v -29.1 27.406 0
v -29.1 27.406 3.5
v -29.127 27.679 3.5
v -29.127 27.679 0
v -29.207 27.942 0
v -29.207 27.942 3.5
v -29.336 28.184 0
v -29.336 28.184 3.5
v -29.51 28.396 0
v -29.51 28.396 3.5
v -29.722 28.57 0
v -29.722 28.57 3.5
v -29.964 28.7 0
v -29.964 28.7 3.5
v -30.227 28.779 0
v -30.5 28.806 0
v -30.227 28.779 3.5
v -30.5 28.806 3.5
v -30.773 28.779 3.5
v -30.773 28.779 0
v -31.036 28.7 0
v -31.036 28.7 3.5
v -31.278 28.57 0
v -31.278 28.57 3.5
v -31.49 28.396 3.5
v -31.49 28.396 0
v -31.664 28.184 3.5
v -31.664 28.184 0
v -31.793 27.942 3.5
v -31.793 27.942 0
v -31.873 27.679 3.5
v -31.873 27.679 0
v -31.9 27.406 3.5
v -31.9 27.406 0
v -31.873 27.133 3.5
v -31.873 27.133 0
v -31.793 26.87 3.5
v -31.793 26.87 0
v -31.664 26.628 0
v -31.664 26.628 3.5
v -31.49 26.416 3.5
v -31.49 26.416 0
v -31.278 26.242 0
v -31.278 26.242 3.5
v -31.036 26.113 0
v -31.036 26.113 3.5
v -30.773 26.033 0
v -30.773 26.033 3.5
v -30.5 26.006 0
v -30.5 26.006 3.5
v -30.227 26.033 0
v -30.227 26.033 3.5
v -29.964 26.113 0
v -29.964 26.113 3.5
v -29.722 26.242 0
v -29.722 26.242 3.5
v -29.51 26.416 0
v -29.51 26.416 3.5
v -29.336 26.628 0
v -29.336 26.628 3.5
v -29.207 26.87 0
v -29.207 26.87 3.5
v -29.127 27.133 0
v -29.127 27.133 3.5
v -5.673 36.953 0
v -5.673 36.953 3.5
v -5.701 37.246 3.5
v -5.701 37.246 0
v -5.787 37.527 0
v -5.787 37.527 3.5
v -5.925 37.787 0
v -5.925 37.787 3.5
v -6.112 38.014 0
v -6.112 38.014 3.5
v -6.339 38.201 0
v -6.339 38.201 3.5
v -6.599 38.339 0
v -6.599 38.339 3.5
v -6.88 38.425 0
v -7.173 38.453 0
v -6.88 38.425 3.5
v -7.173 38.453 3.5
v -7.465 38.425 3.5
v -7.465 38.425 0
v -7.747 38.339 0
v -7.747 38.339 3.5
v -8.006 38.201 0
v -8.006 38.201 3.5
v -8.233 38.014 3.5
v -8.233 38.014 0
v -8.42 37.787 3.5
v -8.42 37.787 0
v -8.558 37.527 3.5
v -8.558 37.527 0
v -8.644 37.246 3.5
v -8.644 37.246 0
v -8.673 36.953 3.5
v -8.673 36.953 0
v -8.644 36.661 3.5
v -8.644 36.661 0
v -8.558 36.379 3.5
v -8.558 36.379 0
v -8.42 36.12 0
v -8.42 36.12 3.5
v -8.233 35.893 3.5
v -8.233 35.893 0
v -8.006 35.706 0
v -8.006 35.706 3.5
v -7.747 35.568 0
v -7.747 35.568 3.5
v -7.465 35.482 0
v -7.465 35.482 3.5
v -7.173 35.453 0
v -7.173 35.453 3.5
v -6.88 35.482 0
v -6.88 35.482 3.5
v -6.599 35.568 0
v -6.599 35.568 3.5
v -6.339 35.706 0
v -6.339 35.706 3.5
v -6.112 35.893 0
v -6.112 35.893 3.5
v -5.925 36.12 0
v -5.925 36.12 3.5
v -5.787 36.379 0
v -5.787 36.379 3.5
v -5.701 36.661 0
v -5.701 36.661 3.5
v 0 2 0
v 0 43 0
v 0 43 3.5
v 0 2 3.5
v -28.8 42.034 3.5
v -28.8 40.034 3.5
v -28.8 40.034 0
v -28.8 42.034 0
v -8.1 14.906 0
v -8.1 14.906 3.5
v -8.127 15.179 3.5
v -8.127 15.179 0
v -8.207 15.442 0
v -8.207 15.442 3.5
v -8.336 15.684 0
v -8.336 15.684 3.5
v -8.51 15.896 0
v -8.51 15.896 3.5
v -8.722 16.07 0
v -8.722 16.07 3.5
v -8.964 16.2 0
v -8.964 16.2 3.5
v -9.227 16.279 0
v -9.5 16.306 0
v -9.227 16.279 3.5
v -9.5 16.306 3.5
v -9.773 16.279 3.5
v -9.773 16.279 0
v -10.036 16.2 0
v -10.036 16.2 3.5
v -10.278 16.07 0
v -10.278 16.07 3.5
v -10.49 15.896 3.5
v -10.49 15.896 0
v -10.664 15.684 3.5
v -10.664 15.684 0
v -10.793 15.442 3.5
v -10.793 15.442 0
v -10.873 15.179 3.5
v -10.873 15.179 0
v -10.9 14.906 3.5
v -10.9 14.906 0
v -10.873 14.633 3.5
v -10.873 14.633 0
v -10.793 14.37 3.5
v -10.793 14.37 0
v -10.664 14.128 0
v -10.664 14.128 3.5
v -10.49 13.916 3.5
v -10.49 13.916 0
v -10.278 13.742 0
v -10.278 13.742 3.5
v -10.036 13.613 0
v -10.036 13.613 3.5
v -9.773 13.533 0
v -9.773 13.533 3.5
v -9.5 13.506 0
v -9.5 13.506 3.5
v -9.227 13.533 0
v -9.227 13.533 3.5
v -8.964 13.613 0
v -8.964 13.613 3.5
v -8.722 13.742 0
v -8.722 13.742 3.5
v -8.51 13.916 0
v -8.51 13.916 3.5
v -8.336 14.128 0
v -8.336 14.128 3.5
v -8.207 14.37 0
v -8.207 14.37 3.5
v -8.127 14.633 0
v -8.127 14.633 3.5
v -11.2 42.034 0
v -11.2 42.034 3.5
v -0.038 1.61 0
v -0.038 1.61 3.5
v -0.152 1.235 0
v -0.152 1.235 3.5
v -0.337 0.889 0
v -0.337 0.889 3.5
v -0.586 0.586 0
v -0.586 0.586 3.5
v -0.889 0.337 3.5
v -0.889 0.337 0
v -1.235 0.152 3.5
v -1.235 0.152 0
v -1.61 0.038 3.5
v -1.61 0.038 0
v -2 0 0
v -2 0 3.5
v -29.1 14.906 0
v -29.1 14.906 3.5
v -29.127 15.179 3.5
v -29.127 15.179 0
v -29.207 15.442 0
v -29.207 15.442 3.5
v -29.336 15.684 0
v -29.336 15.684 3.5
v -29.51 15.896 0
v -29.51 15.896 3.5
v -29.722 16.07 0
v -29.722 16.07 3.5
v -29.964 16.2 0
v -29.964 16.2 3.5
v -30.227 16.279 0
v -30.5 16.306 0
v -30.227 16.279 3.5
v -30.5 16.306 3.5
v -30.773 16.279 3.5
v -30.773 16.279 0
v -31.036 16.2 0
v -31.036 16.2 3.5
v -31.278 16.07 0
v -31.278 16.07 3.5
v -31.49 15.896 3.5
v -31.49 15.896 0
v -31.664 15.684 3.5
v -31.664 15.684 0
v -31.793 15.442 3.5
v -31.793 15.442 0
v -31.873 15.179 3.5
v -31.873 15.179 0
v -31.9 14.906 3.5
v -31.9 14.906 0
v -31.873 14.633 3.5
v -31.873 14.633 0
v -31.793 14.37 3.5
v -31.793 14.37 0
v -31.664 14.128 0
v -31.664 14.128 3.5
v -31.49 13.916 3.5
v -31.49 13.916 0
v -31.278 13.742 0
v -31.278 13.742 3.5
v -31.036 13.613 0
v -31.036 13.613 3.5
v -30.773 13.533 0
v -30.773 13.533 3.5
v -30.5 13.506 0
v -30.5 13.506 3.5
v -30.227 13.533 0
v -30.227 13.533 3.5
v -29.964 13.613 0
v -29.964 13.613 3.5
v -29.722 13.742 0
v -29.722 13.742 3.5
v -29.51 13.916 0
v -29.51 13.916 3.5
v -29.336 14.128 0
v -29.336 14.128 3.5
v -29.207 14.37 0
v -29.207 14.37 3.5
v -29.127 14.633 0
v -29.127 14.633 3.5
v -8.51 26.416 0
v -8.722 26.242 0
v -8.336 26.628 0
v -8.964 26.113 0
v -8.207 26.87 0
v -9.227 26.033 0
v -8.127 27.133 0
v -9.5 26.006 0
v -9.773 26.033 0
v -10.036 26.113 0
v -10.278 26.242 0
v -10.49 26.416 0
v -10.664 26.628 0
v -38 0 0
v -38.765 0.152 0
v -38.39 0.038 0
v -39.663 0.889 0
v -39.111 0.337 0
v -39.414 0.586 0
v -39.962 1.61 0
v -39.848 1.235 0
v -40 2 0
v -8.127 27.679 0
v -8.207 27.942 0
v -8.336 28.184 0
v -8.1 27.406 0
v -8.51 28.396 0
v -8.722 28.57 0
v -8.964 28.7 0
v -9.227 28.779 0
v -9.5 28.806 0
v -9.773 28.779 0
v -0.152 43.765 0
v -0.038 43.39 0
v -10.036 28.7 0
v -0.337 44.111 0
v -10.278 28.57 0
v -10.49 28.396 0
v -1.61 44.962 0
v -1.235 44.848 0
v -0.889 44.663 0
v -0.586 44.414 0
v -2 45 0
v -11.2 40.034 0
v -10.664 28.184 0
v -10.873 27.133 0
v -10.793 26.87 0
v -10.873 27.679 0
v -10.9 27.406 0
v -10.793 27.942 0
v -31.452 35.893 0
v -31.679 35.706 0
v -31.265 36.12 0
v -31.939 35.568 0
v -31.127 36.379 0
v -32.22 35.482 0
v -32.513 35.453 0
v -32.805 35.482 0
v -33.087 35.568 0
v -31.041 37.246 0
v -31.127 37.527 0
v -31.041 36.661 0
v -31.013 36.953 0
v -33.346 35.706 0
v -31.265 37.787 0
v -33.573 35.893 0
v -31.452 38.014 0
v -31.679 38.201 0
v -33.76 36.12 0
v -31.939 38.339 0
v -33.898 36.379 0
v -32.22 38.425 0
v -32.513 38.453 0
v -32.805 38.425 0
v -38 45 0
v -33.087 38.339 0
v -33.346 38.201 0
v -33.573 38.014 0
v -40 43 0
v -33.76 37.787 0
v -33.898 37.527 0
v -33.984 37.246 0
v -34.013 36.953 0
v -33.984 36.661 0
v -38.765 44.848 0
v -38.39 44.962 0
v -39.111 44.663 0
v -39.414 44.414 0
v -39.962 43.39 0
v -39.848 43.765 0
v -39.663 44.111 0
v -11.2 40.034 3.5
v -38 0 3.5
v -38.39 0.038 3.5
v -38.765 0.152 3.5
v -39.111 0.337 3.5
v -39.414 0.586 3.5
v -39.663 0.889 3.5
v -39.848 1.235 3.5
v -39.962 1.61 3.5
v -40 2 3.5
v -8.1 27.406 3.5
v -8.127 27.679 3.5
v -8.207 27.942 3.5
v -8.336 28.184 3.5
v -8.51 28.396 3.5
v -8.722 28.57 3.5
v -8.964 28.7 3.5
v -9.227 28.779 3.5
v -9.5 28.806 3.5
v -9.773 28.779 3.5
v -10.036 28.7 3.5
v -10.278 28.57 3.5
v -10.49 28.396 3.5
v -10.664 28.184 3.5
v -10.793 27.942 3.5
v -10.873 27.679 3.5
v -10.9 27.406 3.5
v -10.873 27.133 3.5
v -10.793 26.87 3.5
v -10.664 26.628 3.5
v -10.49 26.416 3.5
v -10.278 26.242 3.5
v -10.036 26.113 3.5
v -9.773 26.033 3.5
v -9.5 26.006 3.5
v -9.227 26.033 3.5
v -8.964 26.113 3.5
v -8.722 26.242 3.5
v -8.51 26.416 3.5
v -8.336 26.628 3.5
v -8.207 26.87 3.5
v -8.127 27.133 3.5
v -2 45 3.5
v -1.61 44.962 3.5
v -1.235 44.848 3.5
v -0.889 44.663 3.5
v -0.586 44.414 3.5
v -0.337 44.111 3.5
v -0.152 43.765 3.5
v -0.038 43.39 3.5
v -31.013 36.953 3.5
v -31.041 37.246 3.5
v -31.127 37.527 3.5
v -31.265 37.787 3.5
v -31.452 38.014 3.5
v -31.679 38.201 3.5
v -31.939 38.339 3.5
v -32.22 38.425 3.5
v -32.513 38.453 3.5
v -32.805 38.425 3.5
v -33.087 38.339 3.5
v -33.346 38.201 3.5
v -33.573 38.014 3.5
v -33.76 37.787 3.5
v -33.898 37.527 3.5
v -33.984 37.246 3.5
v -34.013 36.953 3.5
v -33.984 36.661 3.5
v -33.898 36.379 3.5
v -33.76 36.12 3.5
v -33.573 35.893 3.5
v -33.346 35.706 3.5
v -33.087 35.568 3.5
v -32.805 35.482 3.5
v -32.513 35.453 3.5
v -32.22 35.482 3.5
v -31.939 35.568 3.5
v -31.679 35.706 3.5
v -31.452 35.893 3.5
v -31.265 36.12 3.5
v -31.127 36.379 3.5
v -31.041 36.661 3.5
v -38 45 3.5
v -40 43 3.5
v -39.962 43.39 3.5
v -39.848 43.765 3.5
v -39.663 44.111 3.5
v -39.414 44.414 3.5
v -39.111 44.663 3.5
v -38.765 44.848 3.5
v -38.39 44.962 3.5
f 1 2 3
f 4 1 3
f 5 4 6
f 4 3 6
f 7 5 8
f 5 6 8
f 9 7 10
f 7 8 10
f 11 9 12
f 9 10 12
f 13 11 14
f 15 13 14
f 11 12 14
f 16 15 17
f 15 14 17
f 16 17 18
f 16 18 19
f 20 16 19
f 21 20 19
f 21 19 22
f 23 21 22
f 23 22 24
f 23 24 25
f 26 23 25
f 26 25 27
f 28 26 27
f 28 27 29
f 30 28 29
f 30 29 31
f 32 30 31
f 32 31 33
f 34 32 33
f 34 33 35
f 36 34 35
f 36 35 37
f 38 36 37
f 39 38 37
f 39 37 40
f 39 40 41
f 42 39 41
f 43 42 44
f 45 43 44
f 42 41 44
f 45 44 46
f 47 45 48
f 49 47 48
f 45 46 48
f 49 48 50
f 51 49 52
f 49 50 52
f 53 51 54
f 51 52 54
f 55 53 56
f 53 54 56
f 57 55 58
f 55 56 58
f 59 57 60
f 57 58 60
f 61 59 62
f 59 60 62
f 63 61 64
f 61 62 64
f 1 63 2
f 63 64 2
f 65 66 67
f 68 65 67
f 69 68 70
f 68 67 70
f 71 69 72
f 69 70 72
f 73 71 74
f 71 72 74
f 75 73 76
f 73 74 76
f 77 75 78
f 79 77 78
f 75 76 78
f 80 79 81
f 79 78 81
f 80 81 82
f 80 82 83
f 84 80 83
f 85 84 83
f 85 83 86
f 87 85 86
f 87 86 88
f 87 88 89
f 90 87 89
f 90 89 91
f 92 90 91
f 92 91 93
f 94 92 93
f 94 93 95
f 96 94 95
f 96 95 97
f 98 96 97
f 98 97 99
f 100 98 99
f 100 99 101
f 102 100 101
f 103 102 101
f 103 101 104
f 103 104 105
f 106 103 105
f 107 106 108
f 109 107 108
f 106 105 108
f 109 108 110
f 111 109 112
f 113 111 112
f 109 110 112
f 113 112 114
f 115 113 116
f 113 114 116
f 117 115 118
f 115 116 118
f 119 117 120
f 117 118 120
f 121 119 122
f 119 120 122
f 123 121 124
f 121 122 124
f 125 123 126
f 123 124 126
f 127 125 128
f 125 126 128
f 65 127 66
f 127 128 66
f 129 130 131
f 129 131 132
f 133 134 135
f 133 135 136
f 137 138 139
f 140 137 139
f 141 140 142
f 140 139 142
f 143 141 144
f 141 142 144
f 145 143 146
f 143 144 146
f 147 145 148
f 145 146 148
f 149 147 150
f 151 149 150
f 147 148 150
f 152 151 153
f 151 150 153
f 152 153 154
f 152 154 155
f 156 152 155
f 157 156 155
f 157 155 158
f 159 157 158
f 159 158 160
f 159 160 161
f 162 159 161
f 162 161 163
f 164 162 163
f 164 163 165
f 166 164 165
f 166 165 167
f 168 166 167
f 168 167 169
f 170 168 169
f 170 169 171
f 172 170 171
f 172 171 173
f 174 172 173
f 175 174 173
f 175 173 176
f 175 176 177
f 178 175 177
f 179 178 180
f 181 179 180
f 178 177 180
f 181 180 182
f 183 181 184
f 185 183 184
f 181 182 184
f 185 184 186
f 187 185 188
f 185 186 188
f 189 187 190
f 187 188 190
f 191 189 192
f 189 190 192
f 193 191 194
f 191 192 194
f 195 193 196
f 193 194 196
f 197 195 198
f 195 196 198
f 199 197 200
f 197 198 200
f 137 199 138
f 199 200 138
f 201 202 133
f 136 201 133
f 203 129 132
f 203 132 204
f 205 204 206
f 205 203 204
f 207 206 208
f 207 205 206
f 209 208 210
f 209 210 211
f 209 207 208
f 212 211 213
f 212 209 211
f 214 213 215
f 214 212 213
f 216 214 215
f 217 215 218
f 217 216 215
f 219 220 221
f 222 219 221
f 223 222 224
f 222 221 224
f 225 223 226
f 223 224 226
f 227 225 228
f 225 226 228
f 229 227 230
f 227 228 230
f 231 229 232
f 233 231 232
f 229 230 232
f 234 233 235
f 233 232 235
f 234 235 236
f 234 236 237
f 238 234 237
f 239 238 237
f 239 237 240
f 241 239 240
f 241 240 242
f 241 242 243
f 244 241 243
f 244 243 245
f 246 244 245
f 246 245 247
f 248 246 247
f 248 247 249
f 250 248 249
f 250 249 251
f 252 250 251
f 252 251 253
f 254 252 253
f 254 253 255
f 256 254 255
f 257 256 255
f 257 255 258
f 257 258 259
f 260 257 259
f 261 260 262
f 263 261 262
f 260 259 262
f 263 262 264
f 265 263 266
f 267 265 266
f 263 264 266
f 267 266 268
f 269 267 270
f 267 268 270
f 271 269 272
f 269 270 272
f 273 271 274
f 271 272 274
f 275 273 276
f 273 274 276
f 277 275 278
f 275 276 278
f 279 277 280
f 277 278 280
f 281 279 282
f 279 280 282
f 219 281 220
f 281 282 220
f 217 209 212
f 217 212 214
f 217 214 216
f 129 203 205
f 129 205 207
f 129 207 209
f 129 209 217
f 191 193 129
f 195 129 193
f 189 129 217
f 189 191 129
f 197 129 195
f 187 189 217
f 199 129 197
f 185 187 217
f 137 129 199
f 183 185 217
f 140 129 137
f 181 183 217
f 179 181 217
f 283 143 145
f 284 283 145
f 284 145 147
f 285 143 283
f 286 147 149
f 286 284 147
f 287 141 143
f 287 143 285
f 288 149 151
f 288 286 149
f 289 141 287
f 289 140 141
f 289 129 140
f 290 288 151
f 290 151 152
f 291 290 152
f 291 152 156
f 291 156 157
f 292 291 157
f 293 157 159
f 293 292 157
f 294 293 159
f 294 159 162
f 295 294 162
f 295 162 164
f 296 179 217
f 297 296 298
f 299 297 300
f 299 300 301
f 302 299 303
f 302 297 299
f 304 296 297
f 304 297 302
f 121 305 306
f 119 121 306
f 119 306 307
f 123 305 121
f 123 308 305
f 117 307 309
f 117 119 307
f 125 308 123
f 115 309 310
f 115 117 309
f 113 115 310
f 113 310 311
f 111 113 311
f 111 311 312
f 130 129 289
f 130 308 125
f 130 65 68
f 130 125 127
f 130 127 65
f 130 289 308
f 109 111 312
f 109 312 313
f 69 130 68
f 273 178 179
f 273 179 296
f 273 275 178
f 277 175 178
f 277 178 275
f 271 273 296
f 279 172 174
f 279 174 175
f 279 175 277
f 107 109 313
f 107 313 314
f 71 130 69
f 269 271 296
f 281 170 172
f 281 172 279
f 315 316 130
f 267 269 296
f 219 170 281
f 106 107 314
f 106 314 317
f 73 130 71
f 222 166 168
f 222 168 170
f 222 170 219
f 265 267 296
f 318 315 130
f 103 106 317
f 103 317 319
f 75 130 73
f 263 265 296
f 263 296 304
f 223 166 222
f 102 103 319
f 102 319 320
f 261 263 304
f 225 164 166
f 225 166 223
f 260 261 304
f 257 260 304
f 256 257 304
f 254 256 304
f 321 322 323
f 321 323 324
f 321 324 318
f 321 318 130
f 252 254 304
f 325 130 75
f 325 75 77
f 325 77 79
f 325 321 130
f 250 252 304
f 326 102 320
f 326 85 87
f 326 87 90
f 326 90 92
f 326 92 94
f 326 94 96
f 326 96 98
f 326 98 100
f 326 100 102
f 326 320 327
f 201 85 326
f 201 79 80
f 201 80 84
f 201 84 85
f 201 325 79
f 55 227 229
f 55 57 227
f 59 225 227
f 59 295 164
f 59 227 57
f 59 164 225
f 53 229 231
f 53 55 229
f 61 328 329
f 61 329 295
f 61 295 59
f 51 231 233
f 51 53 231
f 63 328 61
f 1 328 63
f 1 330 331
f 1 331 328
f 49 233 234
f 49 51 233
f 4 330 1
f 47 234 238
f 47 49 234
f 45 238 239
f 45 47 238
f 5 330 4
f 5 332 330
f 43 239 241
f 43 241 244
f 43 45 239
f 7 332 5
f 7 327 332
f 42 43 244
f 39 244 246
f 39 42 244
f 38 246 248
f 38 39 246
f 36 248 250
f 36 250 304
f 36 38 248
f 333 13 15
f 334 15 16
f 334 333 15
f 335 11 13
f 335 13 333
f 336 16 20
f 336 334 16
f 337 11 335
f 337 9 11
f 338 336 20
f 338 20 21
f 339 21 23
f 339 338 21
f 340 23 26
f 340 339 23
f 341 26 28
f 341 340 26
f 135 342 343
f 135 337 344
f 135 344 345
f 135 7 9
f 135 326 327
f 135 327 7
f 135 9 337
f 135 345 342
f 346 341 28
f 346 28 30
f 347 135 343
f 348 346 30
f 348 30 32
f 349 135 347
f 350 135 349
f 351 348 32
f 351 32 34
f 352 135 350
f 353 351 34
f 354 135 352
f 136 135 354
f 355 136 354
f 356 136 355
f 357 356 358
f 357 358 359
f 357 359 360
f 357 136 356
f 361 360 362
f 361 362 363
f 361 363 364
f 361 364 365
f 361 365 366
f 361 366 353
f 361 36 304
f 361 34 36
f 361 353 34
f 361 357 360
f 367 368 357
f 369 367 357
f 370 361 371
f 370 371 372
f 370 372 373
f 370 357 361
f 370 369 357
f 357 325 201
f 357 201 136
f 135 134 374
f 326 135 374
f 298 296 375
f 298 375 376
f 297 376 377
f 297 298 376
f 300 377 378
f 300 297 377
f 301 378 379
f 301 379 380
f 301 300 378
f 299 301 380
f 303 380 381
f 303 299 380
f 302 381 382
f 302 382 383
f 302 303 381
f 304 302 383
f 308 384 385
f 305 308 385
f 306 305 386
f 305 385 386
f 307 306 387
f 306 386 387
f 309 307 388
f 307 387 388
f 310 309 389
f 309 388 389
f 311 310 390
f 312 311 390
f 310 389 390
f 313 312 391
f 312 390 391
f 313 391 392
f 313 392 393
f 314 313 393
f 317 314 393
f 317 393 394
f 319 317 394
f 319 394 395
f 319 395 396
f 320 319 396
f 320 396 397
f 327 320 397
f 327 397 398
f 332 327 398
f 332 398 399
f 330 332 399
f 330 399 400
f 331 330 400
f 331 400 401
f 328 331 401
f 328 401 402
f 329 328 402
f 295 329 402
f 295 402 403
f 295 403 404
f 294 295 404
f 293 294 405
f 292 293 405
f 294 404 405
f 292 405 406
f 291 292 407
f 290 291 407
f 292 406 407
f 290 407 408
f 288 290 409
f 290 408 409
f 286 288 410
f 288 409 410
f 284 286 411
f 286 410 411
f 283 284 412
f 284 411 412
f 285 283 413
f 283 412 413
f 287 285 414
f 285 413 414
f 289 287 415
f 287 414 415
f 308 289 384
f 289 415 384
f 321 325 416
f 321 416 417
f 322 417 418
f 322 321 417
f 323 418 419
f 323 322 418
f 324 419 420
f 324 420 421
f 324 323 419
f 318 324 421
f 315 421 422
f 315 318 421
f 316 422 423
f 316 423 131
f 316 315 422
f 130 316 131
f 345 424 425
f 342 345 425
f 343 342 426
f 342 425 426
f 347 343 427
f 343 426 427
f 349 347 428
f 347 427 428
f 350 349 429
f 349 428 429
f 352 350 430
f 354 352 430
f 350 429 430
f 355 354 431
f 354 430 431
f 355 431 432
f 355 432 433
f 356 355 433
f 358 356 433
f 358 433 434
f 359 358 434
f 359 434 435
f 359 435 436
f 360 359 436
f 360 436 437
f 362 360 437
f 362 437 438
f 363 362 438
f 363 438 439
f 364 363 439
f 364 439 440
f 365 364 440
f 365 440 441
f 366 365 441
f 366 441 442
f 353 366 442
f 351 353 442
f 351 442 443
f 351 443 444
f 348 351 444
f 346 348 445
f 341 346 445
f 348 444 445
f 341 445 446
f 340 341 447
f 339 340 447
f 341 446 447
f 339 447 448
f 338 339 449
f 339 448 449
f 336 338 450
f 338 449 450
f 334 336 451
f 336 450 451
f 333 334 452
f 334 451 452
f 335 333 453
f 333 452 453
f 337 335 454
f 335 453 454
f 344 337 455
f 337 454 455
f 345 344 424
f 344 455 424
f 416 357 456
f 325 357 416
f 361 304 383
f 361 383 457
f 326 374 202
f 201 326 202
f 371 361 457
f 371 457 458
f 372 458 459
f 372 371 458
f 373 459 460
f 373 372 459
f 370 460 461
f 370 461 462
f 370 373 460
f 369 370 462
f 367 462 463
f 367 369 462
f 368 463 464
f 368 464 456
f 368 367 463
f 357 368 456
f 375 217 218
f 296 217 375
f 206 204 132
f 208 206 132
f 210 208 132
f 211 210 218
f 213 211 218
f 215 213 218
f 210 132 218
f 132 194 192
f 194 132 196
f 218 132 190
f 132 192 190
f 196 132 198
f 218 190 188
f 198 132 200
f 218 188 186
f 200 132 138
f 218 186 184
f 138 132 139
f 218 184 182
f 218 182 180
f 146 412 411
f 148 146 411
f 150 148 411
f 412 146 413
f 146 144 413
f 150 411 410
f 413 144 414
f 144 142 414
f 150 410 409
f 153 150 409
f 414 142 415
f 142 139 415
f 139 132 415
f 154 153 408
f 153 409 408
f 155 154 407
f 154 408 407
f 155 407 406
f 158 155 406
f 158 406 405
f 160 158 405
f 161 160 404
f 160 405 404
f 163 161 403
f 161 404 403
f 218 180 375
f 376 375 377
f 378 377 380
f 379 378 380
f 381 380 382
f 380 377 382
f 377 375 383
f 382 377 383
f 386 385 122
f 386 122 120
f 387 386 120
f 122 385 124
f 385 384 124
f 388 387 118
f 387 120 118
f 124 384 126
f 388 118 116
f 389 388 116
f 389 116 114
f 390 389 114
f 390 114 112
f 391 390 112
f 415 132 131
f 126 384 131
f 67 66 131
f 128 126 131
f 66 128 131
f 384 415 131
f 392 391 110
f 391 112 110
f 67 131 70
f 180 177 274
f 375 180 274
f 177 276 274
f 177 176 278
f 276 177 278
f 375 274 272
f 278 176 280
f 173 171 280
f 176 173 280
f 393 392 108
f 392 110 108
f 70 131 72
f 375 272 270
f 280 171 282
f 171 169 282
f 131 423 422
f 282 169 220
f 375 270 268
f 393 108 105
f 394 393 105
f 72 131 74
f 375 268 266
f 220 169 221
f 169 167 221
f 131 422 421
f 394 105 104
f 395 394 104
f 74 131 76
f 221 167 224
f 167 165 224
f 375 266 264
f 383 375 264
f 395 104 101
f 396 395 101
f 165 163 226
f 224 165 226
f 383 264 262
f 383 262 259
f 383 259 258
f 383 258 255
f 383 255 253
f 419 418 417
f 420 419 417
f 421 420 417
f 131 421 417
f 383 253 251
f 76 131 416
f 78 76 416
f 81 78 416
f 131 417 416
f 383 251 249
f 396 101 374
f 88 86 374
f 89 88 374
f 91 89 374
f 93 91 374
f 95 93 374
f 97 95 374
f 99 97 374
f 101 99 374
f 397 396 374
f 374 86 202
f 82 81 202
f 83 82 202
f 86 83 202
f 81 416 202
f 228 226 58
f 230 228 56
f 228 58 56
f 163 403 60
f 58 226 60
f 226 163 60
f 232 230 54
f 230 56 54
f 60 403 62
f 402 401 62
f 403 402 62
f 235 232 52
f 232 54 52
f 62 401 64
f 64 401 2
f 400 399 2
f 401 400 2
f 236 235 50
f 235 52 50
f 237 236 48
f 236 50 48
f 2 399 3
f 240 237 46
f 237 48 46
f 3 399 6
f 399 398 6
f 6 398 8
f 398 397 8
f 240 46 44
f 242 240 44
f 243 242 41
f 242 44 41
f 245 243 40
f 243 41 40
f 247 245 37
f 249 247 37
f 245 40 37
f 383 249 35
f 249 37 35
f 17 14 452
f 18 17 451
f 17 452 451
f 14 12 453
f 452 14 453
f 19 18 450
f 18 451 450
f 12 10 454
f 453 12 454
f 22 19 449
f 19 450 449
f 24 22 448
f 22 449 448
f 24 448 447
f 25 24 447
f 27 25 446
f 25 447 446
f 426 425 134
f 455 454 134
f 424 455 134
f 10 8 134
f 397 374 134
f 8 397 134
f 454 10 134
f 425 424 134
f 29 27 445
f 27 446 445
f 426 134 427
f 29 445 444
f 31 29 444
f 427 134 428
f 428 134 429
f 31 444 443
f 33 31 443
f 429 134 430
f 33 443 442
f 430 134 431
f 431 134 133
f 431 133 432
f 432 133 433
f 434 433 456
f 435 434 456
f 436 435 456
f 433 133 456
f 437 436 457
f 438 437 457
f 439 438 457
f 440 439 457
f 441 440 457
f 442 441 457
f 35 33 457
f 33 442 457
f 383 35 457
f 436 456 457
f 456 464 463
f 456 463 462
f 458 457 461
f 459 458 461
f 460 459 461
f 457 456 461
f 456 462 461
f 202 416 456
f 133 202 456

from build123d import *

# Parameters (mm, degrees)
BOSS_EXTRUDE1_DEPTH = 3.5
SKETCH2_W           = 8.8
SKETCH2_H           = 2
CUT_EXTRUDE1_DEPTH  = 61.309617744
SKETCH3_R           = 1.5
CUT_EXTRUDE2_DEPTH  = 61.309617744
SKETCH4_R           = 1.4
CUT_EXTRUDE3_DEPTH  = 61.309617744


with BuildPart() as part:
    # Sketch1 → Boss-Extrude1 (new body)
    with BuildSketch(Plane.XY):
        with BuildLine():
            Line((-2, 0), (-38, 0))
            ThreePointArc((-38, 0), (-39.414213562, 0.585786438), (-40, 2))
            Line((-40, 2), (-40, 42.999999916))
            ThreePointArc((-40, 42.999999916), (-39.414213562, 44.414213478), (-38, 44.999999916))
            Line((-38, 44.999999916), (-2, 44.999999916))
            ThreePointArc((-2, 44.999999916), (-0.585786438, 44.414213478), (0, 42.999999916))
            Line((0, 42.999999916), (0, 2))
            ThreePointArc((0, 2), (-0.585786438, 0.585786438), (-2, 0))
        make_face()
    extrude(amount=BOSS_EXTRUDE1_DEPTH)

    # Sketch2 → Cut-Extrude1 (cut, through all)
    with BuildSketch(Plane.XY.offset(3.5)):
        with Locations((-24.4, 41.033946817)):
            Rectangle(SKETCH2_W, SKETCH2_H)
        with Locations((-15.6, 41.033946817)):
            Rectangle(SKETCH2_W, SKETCH2_H)
    extrude(amount=-CUT_EXTRUDE1_DEPTH, mode=Mode.SUBTRACT)

    # Sketch3 → Cut-Extrude2 (cut, through all)
    with BuildSketch(Plane.XY.offset(3.5)):
        with Locations((-32.512621431, 36.953417216)):
            Circle(SKETCH3_R)
        with Locations((-7.172621431, 36.953417216)):
            Circle(SKETCH3_R)
    extrude(amount=-CUT_EXTRUDE2_DEPTH, mode=Mode.SUBTRACT)

    # Sketch4 → Cut-Extrude3 (cut, through all)
    with BuildSketch(Plane.XY.offset(3.5)):
        with Locations((-30.5, 27.406241852)):
            Circle(SKETCH4_R)
        with Locations((-30.5, 14.906241852)):
            Circle(SKETCH4_R)
        with Locations((-9.5, 14.906241852)):
            Circle(SKETCH4_R)
        with Locations((-9.5, 27.406241852)):
            Circle(SKETCH4_R)
    extrude(amount=-CUT_EXTRUDE3_DEPTH, mode=Mode.SUBTRACT)


solid = part.part
